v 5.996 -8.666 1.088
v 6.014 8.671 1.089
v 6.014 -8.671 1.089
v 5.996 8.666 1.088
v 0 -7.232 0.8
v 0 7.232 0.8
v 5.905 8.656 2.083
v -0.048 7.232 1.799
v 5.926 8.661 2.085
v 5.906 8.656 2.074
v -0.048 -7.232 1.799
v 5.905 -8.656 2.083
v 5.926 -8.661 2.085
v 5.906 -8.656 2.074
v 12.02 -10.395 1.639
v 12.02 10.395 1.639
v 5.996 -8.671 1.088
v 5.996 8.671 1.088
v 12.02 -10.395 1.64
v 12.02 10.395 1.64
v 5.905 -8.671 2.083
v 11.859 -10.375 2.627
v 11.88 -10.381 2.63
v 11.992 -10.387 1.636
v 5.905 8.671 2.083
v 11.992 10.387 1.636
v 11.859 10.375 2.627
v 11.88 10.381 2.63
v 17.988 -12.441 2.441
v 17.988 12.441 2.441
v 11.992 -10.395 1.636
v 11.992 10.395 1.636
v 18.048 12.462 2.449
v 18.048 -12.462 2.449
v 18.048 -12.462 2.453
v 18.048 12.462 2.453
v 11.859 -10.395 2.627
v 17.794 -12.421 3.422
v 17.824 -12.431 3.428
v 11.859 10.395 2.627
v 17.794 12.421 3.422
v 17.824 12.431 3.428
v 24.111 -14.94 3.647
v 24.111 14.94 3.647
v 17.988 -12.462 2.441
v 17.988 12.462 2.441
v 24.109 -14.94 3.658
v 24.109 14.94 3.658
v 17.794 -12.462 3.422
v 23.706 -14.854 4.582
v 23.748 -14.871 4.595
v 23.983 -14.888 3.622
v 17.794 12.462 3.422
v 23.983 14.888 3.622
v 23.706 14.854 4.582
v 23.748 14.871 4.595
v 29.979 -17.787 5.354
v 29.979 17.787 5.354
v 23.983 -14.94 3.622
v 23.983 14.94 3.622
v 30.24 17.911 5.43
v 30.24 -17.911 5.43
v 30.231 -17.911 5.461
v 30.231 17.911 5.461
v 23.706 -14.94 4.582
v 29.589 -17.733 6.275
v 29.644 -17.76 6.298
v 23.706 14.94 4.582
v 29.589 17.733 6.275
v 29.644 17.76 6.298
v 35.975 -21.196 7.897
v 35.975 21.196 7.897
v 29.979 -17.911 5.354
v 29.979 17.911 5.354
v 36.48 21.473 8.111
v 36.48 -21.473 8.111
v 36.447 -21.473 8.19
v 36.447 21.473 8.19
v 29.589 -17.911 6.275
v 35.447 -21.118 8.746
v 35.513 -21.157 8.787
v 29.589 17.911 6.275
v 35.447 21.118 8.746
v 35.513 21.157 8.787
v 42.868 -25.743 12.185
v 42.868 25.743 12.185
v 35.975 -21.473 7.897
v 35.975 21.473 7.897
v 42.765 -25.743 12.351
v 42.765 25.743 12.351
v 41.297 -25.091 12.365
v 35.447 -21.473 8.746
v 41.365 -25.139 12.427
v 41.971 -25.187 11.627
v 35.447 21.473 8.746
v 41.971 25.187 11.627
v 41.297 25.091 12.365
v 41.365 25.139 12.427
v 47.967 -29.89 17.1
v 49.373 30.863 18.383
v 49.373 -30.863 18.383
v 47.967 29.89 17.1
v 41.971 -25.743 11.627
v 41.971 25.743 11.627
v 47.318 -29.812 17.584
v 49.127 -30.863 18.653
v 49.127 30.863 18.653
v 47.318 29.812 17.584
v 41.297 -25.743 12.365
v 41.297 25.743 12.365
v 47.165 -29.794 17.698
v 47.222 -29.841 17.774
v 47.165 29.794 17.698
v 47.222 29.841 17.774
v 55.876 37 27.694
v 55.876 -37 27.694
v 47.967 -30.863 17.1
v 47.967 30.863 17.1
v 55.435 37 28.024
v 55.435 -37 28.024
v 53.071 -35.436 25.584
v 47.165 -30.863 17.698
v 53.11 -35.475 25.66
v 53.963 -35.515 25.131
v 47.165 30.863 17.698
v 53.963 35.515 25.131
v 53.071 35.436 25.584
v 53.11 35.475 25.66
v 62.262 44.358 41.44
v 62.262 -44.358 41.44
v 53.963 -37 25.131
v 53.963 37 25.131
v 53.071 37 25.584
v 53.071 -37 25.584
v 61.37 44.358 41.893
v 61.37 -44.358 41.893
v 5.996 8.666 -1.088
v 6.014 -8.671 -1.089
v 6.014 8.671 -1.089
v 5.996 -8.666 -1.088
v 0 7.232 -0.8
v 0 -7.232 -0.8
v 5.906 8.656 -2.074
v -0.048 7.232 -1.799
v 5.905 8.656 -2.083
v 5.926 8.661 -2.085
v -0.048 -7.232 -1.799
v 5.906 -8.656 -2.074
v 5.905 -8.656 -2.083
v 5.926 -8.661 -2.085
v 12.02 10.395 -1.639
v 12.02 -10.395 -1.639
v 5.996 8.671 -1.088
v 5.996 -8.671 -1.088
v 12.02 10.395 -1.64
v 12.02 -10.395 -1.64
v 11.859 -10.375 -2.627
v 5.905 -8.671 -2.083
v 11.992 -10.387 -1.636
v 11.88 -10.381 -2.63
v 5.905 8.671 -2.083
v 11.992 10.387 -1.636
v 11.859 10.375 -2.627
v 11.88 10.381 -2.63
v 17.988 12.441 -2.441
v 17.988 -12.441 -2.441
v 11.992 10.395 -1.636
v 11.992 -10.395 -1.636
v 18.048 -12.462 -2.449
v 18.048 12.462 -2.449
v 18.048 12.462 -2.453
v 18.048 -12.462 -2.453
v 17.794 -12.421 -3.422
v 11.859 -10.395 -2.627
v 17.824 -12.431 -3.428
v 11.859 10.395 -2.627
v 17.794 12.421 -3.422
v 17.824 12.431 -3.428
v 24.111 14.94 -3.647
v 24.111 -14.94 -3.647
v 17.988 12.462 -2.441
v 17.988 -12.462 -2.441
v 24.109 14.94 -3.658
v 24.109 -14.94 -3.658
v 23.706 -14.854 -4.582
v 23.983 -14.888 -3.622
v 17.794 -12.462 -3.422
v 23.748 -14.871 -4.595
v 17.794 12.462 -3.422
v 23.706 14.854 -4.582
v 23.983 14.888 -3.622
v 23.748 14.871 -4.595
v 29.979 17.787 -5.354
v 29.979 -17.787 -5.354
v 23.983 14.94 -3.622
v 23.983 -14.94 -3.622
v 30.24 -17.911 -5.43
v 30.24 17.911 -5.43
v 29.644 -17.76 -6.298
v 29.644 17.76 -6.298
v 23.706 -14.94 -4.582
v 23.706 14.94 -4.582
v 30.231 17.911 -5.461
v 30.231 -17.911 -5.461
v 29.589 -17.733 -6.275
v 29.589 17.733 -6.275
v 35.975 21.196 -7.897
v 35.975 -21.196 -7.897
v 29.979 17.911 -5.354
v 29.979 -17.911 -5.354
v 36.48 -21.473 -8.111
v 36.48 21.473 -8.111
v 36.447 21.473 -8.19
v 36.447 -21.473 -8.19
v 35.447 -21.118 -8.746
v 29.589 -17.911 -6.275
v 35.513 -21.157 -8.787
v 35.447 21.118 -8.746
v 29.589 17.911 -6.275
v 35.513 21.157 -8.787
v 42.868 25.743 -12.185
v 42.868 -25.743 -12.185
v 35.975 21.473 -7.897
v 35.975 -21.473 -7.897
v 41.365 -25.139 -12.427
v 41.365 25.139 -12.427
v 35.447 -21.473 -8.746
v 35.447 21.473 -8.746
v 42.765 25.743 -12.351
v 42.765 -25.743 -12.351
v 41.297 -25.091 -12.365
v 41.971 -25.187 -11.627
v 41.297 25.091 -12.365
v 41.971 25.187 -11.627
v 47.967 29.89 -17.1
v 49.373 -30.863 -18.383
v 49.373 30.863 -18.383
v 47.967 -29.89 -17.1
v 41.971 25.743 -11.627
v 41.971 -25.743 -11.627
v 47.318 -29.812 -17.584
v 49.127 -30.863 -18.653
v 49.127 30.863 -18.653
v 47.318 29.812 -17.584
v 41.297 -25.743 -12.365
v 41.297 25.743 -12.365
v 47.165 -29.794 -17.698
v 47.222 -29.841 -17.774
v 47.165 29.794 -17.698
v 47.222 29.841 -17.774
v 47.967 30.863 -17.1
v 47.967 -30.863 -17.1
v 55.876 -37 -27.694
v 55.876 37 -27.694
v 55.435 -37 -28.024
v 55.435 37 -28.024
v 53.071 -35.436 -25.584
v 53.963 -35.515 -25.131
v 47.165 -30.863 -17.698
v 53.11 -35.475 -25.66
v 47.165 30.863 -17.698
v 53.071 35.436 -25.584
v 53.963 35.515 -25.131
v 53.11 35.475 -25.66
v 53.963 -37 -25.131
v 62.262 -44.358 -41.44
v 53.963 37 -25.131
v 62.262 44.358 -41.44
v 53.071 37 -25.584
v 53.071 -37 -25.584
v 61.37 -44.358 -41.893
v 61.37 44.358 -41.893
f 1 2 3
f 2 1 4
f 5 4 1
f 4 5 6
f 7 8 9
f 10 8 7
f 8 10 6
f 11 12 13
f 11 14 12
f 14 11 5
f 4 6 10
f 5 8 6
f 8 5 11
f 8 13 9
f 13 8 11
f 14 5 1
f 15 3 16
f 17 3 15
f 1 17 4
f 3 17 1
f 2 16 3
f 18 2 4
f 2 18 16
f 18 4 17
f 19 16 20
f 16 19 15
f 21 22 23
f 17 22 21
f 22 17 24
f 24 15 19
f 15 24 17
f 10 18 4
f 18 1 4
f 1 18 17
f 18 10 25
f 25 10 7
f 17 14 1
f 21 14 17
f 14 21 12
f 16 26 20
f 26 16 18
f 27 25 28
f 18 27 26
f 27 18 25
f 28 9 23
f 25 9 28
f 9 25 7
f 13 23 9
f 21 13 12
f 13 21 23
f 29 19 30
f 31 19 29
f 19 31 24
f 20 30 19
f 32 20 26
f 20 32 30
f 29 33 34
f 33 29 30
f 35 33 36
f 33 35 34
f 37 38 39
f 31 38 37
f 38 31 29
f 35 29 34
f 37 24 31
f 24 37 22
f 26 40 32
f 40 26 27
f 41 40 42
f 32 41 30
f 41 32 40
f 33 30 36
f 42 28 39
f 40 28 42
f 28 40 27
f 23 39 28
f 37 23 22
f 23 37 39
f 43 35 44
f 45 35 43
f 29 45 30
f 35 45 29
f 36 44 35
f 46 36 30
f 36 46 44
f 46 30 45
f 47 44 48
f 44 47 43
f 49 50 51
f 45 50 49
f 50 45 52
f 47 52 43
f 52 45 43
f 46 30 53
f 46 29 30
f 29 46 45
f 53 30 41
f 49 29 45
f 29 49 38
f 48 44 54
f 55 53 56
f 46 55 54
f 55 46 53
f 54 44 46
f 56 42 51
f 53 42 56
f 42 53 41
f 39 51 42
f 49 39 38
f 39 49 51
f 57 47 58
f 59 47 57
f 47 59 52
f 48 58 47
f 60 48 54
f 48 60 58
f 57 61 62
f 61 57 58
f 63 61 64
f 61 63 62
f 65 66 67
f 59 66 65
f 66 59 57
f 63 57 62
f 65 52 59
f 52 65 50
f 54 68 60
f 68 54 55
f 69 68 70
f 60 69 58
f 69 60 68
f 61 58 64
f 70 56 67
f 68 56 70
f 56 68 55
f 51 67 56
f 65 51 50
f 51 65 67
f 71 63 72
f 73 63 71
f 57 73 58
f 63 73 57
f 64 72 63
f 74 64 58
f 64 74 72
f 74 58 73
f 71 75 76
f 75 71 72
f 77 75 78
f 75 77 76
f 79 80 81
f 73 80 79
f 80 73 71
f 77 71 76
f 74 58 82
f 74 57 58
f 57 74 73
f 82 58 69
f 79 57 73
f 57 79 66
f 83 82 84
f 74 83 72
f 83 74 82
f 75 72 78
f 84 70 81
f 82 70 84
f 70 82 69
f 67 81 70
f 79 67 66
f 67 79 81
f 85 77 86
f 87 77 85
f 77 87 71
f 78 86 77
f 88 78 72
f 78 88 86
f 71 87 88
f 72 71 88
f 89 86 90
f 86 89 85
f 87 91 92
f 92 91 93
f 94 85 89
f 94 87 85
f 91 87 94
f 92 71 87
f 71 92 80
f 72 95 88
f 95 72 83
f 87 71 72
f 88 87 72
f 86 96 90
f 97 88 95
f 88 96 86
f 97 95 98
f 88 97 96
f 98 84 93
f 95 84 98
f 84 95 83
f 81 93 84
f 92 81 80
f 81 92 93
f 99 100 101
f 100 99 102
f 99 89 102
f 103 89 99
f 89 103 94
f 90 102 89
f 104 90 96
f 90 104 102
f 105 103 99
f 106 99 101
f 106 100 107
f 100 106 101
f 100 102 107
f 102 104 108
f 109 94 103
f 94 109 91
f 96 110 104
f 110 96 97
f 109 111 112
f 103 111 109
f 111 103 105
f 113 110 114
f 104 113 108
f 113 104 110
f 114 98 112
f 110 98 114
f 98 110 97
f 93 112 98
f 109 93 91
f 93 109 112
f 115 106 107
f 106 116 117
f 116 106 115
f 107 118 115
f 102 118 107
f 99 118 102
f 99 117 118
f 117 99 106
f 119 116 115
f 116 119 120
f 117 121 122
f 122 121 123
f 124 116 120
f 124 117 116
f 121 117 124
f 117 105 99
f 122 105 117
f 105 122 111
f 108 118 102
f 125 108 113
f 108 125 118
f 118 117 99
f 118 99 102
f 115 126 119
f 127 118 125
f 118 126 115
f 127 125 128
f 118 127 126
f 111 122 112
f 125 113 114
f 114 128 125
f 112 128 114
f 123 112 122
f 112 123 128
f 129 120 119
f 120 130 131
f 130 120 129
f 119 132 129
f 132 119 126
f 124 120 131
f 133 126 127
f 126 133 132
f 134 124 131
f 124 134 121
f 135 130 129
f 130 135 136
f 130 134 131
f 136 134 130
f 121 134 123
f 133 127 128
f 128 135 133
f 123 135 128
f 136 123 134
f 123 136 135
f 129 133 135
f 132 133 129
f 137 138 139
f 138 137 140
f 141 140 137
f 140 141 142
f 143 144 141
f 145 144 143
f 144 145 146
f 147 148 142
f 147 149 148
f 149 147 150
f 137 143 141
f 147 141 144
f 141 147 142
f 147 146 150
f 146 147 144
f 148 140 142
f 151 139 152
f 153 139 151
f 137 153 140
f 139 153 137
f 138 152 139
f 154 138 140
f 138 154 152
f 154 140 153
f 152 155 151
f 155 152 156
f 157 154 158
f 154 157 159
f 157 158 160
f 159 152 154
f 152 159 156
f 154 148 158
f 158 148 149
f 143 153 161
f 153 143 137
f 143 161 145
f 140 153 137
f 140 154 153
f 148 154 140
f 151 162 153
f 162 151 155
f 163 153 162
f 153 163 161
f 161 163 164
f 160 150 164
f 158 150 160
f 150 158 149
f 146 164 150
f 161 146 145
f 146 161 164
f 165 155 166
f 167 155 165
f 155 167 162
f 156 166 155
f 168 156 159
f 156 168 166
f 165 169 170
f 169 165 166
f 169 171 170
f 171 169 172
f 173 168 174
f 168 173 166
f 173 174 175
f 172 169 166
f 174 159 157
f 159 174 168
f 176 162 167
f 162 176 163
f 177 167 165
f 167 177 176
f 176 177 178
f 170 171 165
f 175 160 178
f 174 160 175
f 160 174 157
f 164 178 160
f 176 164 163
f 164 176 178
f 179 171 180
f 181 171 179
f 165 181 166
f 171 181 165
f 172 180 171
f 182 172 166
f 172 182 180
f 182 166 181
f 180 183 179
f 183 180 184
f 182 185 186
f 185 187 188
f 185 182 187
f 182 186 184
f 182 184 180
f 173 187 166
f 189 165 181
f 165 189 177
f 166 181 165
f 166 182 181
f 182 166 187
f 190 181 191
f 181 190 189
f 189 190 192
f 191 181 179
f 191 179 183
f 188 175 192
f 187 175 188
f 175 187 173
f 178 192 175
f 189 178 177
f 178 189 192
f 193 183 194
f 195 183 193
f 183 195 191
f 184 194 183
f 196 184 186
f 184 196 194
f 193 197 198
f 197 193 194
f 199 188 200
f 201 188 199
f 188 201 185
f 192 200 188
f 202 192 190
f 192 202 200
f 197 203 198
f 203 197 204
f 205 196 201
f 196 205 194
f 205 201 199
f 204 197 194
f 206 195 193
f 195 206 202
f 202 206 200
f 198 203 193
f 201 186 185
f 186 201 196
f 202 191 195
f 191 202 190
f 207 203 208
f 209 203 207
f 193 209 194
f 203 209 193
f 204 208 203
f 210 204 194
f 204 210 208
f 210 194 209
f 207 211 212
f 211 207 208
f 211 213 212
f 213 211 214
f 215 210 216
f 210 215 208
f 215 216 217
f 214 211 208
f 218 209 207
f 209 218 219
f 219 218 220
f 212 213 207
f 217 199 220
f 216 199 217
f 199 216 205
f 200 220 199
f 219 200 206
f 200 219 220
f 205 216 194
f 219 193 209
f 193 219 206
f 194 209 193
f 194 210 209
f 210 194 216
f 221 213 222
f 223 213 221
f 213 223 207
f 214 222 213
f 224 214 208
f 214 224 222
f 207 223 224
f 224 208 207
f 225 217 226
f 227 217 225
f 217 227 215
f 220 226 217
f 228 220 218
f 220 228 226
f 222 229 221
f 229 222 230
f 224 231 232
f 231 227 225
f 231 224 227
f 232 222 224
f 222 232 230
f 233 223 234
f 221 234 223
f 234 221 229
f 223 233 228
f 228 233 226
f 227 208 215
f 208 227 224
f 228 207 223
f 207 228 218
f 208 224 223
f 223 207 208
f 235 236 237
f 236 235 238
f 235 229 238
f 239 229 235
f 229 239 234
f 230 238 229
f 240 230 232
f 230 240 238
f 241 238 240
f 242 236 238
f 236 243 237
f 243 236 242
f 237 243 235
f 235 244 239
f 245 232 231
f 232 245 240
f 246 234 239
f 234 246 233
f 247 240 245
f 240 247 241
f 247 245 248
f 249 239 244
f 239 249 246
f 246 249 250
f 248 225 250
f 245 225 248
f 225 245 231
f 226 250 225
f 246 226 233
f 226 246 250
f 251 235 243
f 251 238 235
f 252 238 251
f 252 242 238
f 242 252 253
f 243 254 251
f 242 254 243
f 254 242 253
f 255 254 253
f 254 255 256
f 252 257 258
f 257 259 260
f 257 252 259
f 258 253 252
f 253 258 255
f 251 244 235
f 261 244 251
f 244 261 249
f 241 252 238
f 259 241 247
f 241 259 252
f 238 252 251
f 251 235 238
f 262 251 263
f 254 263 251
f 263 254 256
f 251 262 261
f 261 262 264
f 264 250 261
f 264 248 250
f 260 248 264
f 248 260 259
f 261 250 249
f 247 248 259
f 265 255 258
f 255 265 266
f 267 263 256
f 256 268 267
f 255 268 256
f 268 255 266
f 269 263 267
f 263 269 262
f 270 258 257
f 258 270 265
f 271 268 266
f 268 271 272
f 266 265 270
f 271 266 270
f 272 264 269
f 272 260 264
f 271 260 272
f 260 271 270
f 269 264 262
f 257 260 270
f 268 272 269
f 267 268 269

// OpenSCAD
module placa(N=10,freq=2,d0=1.6,dL=74){
  // N: número de secciones
  // freq: frecuencia mínima
  // d0: dist mínima entre las placas
  // dL: dist máxima entre las placas
  
  wMin = 12.05; // Anchura mínima del primer segmento

  //-- Determinación de constantes
  lambda = 299.792458/freq;
  L = 0.4*lambda;  // Longitud en proyección vertical
  a = d0;
  b = ln(dL/d0)/L;
  eta = 120*3.142;
  Z0 = 50;
  alpha = ln(eta/Z0)/L;
  
  
  //linear_extrude(height=2,v=[0,0,1],center=true)
  //polygon(points=[[0,w/2],[0,-w/2],[]]);

  // Generación de puntos
  //vertices = [
  //    for (x = [0 : L/N : L])
  //        [x, a*pow(2.71828,b*x)]
  //];
  function altRel(i) = (a*pow(2.71828,b*L*i/N)-a*pow(2.71828,b*L*(i-1)/N))/2;
  function theta(i) = atan(N*altRel(i)/L);
  function R(i) = L/(N*cos(theta(i)));
  function w(i) = eta*a*pow(2.71828,(b-alpha)*i*L/N)/Z0;
  
  R1 = L/(N*cos(atan(N*(a*pow(2.71828,b*L/N)-a*pow(2.71828,b*d0))/(2*L))));
  v = [
      [
      [0,-wMin/2],
      [0,wMin/2],
      [R1,w(1)/2],
      [R1,-w(1)/2],
      ],
      [
      [0,-w(1)/2],
      [0,w(1)/2],
      [R(2),w(2)/2],
      [R(2),-w(2)/2],
      ],
    for (i=[2 : 1 : N])
      [
      [0,-w(i)/2],
      [0,w(i)/2],
      [R(i+1),w(i+1)/2],
      [R(i+1),-w(i+1)/2],
      ]
  ];
  
  theta1 = atan(N*(a*pow(2.71828,b*L/N)-a*pow(2.71828,b*d0))/(2*L));
    
  translate([0,0,d0/2])
  rotate([0,-theta1,0])
  linear_extrude(height=1)
  polygon(points=v[1]);
    
//  sumaCos = [
//    for (i=[2:1:N])
//      R(i)*cos(theta(i)),
//    ];
//  sumaSin = [
//    for (i=[2:1:N])
//      R(i)*sin(theta(i)),
//    ];
//
//  echo(sumaCos);
//    
//    
//  for (i=[2 : 1 : N]) {
//    translate([R1*cos(theta1),0,R1*sin(theta1)+d0/2])
//    rotate([0,-theta(i),0])
//    linear_extrude(height=1)
//    polygon(points=v[i]);
//  }
  
  function RC(i) = R(i)*cos(theta(i));
  function RS(i) = R(i)*sin(theta(i));
  
  translate([R1*cos(theta1),0,R1*sin(theta1)+d0/2])
  rotate([0,-theta(2),0])
  linear_extrude(height=1)
  polygon(points=v[2]);
  
  translate([R1*cos(theta1)+RC(2),0,R1*sin(theta1)+RS(2)+d0/2])
  rotate([0,-theta(3),0])
  linear_extrude(height=1)
  polygon(points=v[3]);
  
  translate([R1*cos(theta1)+RC(2)+RC(3),0,R1*sin(theta1)+RS(2)+RS(3)+d0/2])
  rotate([0,-theta(4),0])
  linear_extrude(height=1)
  polygon(points=v[4]);
  
  translate([R1*cos(theta1)+RC(2)+RC(3)+RC(4),0,R1*sin(theta1)+RS(2)+RS(3)+RS(4)+d0/2])
  rotate([0,-theta(5),0])
  linear_extrude(height=1)
  polygon(points=v[5]);
  
  translate([R1*cos(theta1)+RC(2)+RC(3)+RC(4)+RC(5),0,R1*sin(theta1)+RS(2)+RS(3)+RS(4)+RS(5)+d0/2])
  rotate([0,-theta(6),0])
  linear_extrude(height=1)
  polygon(points=v[6]);
  
  translate([R1*cos(theta1)+RC(2)+RC(3)+RC(4)+RC(5)+RC(6),0,R1*sin(theta1)+RS(2)+RS(3)+RS(4)+RS(5)+RS(6)+d0/2])
  rotate([0,-theta(7),0])
  linear_extrude(height=1)
  polygon(points=v[7]);
  
  translate([R1*cos(theta1)+RC(2)+RC(3)+RC(4)+RC(5)+RC(6)+RC(7),0,R1*sin(theta1)+RS(2)+RS(3)+RS(4)+RS(5)+RS(6)+RS(7)+d0/2])
  rotate([0,-theta(8),0])
  linear_extrude(height=1)
  polygon(points=v[8]);
  
  translate([R1*cos(theta1)+RC(2)+RC(3)+RC(4)+RC(5)+RC(6)+RC(7)+RC(8),0,R1*sin(theta1)+RS(2)+RS(3)+RS(4)+RS(5)+RS(6)+RS(7)+RS(8)+d0/2])
  rotate([0,-theta(9),0])
  linear_extrude(height=1)
  polygon(points=v[9]);
  
  translate([R1*cos(theta1)+RC(2)+RC(3)+RC(4)+RC(5)+RC(6)+RC(7)+RC(8)+RC(9),0,R1*sin(theta1)+RS(2)+RS(3)+RS(4)+RS(5)+RS(6)+RS(7)+RS(8)+RS(9)+d0/2])
  rotate([0,-theta(10),0])
  linear_extrude(height=1)
  polygon(points=v[10]);
  
}


union(){
  placa();

  mirror([0,0,180])
  placa();
}
